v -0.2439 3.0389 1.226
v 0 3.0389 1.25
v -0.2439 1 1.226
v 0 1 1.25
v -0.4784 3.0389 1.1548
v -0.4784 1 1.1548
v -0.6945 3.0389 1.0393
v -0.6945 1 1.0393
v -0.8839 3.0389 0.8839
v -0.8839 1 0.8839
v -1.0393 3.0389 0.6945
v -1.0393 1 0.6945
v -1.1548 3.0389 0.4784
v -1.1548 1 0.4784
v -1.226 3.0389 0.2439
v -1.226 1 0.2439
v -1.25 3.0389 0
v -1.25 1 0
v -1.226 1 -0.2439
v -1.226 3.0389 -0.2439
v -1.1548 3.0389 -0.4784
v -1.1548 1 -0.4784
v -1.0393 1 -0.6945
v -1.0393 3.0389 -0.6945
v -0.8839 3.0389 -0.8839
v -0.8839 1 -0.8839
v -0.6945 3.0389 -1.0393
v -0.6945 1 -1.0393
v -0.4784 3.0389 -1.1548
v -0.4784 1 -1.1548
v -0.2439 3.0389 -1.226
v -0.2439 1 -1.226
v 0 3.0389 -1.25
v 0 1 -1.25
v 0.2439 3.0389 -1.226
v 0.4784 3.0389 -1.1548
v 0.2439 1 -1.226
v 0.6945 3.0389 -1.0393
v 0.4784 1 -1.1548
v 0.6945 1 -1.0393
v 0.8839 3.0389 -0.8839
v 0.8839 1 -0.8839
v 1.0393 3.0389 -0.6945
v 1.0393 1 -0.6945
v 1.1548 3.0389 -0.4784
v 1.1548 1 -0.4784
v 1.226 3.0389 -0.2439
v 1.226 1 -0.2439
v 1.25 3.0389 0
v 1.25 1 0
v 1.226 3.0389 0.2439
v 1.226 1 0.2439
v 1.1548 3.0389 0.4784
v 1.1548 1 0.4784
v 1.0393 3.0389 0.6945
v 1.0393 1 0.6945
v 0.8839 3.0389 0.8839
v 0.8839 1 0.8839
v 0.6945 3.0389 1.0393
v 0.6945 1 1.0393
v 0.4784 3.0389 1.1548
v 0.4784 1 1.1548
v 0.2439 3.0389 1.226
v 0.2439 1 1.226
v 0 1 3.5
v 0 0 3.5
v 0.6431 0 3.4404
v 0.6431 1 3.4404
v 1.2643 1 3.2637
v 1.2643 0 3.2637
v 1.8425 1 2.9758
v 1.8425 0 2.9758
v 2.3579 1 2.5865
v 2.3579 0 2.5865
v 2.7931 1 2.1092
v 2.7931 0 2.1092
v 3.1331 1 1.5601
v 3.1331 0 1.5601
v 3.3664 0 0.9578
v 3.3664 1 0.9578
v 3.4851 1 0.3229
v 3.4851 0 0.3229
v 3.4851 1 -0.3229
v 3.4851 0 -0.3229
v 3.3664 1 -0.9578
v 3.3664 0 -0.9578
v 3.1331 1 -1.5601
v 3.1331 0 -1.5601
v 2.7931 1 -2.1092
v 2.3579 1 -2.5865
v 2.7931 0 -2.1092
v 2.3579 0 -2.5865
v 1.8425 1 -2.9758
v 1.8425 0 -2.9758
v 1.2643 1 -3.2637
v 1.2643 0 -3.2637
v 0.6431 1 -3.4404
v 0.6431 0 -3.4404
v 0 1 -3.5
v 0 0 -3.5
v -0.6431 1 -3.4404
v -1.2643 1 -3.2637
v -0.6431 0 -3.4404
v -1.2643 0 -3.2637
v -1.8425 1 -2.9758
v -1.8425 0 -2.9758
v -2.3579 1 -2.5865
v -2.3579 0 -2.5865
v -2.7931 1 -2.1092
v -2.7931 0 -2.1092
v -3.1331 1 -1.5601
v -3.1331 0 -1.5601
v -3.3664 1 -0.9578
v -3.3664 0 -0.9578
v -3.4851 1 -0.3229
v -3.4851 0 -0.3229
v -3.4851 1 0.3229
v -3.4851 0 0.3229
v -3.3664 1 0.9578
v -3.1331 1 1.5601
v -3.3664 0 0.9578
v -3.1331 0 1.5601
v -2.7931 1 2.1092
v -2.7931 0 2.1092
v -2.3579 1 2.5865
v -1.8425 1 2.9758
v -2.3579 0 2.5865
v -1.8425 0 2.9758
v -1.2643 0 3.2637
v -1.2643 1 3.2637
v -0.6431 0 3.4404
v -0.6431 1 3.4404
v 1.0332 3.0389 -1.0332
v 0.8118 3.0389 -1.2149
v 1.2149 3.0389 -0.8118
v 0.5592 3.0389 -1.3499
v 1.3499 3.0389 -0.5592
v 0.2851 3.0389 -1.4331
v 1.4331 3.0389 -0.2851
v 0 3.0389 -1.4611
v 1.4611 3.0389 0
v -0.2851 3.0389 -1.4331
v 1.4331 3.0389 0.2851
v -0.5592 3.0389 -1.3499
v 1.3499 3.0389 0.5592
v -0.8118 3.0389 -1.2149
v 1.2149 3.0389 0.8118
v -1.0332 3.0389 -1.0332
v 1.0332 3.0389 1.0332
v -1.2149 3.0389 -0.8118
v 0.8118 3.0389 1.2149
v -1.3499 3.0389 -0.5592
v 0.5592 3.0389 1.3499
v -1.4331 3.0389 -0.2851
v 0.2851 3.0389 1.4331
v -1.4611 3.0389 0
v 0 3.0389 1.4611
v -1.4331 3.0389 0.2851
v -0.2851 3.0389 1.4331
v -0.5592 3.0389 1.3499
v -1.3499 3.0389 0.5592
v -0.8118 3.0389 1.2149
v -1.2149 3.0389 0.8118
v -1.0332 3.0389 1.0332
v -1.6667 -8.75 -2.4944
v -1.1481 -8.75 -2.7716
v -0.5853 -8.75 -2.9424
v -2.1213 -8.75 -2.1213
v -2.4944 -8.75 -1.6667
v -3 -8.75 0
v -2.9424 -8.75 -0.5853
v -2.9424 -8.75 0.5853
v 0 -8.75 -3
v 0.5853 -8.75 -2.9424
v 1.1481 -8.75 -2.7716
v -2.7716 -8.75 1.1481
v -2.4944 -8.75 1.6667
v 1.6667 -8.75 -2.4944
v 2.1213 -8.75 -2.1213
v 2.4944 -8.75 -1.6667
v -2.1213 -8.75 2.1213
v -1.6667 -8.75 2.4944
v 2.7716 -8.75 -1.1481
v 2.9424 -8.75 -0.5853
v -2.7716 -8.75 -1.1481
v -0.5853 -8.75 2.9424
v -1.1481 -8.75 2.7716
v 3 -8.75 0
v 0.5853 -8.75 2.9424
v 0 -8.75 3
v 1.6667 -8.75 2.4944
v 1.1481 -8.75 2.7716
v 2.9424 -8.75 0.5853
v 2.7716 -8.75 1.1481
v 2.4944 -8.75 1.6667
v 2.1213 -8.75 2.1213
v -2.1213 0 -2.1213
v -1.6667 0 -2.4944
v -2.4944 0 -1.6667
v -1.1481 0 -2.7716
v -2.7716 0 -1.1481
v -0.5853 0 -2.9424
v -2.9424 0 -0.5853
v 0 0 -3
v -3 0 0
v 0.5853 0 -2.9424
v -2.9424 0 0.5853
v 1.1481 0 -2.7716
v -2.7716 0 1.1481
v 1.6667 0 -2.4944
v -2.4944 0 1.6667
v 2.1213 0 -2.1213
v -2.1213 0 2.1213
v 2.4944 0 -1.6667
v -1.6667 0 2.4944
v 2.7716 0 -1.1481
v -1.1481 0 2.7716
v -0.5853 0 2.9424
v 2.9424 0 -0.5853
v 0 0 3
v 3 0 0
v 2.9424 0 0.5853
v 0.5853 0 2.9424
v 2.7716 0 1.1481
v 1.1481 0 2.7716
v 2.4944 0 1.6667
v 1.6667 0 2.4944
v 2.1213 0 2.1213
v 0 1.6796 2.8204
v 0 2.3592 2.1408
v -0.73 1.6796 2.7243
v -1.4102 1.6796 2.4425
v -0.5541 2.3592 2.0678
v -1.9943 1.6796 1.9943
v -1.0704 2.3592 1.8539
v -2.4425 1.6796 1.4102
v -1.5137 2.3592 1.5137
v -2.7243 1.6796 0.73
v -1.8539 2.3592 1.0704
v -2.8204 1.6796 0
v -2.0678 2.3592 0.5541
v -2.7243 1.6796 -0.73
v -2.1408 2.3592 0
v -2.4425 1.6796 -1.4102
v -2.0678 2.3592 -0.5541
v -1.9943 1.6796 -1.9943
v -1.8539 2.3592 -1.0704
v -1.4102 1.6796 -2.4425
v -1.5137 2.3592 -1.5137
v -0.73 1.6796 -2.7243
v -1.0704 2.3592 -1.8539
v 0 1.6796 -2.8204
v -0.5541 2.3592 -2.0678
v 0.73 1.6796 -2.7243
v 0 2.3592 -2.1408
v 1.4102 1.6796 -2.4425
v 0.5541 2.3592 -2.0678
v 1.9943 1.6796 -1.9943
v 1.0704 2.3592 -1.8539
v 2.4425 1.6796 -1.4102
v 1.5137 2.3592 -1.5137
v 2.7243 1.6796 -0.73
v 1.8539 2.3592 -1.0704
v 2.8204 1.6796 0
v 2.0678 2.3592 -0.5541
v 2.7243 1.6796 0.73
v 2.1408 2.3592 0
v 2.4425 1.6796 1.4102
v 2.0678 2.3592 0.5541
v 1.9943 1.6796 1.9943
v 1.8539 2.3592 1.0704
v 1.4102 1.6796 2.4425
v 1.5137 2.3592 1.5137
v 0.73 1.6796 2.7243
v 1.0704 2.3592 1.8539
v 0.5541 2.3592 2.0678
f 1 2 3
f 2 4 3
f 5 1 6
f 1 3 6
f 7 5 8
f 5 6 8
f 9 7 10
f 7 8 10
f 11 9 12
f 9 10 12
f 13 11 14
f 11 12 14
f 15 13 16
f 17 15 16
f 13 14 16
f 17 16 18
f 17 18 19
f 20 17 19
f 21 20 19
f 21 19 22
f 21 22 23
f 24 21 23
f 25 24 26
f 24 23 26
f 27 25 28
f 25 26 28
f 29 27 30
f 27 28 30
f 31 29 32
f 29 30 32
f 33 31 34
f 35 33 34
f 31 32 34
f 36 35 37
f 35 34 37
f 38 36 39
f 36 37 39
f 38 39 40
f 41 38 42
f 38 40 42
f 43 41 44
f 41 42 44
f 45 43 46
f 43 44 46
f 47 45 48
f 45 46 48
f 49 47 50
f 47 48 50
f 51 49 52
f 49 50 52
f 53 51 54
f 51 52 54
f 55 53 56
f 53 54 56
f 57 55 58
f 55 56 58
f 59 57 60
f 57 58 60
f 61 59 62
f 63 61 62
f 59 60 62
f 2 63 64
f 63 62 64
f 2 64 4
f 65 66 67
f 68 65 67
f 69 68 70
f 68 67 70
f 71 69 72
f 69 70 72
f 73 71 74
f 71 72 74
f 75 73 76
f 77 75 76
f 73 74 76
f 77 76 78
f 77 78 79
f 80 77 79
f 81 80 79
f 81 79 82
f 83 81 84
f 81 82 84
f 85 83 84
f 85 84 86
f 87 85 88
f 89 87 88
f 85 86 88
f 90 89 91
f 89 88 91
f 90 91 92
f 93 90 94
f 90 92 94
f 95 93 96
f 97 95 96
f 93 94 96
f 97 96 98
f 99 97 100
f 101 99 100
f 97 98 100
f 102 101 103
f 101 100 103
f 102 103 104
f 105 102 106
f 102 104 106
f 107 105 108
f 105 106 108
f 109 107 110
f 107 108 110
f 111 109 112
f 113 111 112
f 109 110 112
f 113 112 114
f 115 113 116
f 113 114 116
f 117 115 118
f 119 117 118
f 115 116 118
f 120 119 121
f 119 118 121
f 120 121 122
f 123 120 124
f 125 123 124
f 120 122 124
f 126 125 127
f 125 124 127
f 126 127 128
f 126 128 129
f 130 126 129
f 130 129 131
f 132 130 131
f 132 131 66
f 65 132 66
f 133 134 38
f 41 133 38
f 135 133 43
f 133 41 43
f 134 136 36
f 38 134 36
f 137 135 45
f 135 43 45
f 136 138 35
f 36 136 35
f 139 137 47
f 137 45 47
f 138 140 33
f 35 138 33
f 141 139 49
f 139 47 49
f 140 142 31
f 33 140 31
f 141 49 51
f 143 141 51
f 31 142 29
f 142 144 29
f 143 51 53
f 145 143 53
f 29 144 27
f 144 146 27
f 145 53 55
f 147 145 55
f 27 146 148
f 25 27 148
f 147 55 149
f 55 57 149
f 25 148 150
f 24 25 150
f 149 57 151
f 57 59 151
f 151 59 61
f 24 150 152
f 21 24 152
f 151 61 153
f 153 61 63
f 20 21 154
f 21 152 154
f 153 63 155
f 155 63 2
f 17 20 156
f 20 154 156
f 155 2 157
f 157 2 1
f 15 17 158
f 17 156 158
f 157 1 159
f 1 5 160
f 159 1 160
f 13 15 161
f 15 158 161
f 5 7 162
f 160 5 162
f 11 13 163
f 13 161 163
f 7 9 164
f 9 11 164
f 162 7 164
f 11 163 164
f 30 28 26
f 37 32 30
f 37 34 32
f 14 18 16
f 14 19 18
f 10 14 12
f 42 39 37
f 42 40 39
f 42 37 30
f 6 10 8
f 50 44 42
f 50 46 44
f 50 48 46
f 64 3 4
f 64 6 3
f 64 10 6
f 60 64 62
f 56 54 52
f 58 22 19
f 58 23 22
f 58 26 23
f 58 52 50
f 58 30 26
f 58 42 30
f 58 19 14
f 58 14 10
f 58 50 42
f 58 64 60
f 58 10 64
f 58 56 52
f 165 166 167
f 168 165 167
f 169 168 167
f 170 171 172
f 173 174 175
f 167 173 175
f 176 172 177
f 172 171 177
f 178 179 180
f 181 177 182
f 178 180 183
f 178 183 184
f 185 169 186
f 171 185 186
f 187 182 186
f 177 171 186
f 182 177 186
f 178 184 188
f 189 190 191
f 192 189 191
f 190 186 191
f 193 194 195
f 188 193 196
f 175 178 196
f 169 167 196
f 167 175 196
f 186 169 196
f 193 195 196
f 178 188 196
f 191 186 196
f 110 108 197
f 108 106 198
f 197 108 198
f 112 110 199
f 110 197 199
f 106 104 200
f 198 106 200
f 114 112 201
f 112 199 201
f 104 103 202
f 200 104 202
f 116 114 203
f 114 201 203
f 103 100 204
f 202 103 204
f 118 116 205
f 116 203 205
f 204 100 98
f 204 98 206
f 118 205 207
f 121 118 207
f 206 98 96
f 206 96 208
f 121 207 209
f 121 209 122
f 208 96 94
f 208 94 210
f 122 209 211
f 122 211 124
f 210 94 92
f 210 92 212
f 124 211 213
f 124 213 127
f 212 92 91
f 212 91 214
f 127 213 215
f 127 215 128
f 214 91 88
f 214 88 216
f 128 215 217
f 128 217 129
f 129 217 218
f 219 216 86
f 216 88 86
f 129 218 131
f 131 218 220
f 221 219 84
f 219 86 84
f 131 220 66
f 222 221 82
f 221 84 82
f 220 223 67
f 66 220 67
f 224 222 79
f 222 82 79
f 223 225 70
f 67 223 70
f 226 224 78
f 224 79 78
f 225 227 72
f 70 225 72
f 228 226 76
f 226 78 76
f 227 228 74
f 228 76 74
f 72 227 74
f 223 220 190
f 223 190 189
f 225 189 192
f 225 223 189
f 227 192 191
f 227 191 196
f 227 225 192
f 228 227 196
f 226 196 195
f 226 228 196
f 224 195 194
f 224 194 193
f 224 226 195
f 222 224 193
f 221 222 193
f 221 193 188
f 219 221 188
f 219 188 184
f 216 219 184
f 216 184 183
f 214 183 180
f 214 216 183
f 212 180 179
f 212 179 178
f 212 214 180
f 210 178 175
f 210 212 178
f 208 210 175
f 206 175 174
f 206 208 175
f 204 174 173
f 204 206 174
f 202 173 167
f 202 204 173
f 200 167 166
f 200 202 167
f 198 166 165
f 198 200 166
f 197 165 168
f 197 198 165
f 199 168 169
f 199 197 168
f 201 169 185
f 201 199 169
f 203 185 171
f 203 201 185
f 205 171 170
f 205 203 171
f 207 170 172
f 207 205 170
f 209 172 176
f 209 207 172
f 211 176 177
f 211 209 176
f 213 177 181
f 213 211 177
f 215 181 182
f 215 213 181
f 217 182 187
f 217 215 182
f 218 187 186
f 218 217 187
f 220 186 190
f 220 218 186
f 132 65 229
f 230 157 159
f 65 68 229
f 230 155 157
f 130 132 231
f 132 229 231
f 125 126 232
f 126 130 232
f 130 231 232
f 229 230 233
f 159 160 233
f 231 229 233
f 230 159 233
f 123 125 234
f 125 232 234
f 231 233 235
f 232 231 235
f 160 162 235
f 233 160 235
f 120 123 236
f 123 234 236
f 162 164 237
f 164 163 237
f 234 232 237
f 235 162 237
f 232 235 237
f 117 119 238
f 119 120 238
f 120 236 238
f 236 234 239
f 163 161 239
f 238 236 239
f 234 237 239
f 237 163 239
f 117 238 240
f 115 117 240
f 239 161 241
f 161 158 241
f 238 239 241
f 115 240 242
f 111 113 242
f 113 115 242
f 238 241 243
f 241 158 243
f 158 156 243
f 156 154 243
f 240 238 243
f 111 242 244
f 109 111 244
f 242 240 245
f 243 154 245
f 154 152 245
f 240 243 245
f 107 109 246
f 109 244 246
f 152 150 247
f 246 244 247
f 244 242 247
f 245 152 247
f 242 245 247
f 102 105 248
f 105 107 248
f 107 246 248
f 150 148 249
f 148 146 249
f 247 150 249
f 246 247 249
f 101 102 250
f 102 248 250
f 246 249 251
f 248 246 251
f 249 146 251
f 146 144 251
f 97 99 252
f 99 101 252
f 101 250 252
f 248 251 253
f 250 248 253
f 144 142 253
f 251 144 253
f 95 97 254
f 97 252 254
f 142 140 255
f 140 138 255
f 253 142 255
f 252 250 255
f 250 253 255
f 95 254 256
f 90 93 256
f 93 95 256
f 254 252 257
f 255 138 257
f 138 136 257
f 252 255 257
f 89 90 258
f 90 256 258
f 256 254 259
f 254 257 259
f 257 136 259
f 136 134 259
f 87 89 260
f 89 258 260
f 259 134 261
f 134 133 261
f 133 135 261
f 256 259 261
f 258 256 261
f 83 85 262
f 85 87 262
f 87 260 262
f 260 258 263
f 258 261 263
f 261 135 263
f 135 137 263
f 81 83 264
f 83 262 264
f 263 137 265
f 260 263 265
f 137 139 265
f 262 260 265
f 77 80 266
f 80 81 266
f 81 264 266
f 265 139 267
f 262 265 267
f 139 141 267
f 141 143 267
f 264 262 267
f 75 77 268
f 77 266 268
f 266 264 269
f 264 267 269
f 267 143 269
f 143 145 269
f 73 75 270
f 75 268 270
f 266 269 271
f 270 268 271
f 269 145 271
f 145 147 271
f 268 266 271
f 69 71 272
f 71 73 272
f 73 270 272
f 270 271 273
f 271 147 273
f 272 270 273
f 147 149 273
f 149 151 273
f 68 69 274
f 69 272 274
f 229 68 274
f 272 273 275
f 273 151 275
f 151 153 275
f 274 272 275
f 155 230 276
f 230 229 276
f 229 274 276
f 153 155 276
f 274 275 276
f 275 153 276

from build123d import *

# Parameters (mm, degrees)
SKETCH2_R           = 3
BOSS_EXTRUDE1_DEPTH = 8.75
SKETCH5_R           = 3.5
BOSS_EXTRUDE4_DEPTH = 1


with BuildPart() as part:
    # Sketch2 → Boss-Extrude1 (new body)
    with BuildSketch(Plane(origin=(0, 0, 0), x_dir=(1, 0, 0), z_dir=(0, 1, 0))):
        with Locations(Location((0, 0, 0), (0, 0, 270))):
            Circle(SKETCH2_R)
    extrude(amount=-BOSS_EXTRUDE1_DEPTH)

    # Sketch5 → Boss-Extrude4 (add)
    with BuildSketch(Plane(origin=(0, 0, 0), x_dir=(1, 0, 0), z_dir=(0, 1, 0))):
        with Locations(Location((0, 0, 0), (0, 0, 270))):
            Circle(SKETCH5_R)
    extrude(amount=BOSS_EXTRUDE4_DEPTH)

    # Sketch6 → Revolve1 (revolve)
    with BuildSketch(Plane.XY, mode=Mode.PRIVATE) as revolve1_sk:
        Polygon((-3.5, 1), (-1.461129737, 3.038870263), (-1.25, 3.038870263), (-1.25, 1), align=None)
    revolve(revolve1_sk.sketch.rotate(Axis((0, 3.038870263, 0), (0, -1, 0)), 270), axis=Axis((0, 3.038870263, 0), (0, -1, 0)))


solid = part.part
